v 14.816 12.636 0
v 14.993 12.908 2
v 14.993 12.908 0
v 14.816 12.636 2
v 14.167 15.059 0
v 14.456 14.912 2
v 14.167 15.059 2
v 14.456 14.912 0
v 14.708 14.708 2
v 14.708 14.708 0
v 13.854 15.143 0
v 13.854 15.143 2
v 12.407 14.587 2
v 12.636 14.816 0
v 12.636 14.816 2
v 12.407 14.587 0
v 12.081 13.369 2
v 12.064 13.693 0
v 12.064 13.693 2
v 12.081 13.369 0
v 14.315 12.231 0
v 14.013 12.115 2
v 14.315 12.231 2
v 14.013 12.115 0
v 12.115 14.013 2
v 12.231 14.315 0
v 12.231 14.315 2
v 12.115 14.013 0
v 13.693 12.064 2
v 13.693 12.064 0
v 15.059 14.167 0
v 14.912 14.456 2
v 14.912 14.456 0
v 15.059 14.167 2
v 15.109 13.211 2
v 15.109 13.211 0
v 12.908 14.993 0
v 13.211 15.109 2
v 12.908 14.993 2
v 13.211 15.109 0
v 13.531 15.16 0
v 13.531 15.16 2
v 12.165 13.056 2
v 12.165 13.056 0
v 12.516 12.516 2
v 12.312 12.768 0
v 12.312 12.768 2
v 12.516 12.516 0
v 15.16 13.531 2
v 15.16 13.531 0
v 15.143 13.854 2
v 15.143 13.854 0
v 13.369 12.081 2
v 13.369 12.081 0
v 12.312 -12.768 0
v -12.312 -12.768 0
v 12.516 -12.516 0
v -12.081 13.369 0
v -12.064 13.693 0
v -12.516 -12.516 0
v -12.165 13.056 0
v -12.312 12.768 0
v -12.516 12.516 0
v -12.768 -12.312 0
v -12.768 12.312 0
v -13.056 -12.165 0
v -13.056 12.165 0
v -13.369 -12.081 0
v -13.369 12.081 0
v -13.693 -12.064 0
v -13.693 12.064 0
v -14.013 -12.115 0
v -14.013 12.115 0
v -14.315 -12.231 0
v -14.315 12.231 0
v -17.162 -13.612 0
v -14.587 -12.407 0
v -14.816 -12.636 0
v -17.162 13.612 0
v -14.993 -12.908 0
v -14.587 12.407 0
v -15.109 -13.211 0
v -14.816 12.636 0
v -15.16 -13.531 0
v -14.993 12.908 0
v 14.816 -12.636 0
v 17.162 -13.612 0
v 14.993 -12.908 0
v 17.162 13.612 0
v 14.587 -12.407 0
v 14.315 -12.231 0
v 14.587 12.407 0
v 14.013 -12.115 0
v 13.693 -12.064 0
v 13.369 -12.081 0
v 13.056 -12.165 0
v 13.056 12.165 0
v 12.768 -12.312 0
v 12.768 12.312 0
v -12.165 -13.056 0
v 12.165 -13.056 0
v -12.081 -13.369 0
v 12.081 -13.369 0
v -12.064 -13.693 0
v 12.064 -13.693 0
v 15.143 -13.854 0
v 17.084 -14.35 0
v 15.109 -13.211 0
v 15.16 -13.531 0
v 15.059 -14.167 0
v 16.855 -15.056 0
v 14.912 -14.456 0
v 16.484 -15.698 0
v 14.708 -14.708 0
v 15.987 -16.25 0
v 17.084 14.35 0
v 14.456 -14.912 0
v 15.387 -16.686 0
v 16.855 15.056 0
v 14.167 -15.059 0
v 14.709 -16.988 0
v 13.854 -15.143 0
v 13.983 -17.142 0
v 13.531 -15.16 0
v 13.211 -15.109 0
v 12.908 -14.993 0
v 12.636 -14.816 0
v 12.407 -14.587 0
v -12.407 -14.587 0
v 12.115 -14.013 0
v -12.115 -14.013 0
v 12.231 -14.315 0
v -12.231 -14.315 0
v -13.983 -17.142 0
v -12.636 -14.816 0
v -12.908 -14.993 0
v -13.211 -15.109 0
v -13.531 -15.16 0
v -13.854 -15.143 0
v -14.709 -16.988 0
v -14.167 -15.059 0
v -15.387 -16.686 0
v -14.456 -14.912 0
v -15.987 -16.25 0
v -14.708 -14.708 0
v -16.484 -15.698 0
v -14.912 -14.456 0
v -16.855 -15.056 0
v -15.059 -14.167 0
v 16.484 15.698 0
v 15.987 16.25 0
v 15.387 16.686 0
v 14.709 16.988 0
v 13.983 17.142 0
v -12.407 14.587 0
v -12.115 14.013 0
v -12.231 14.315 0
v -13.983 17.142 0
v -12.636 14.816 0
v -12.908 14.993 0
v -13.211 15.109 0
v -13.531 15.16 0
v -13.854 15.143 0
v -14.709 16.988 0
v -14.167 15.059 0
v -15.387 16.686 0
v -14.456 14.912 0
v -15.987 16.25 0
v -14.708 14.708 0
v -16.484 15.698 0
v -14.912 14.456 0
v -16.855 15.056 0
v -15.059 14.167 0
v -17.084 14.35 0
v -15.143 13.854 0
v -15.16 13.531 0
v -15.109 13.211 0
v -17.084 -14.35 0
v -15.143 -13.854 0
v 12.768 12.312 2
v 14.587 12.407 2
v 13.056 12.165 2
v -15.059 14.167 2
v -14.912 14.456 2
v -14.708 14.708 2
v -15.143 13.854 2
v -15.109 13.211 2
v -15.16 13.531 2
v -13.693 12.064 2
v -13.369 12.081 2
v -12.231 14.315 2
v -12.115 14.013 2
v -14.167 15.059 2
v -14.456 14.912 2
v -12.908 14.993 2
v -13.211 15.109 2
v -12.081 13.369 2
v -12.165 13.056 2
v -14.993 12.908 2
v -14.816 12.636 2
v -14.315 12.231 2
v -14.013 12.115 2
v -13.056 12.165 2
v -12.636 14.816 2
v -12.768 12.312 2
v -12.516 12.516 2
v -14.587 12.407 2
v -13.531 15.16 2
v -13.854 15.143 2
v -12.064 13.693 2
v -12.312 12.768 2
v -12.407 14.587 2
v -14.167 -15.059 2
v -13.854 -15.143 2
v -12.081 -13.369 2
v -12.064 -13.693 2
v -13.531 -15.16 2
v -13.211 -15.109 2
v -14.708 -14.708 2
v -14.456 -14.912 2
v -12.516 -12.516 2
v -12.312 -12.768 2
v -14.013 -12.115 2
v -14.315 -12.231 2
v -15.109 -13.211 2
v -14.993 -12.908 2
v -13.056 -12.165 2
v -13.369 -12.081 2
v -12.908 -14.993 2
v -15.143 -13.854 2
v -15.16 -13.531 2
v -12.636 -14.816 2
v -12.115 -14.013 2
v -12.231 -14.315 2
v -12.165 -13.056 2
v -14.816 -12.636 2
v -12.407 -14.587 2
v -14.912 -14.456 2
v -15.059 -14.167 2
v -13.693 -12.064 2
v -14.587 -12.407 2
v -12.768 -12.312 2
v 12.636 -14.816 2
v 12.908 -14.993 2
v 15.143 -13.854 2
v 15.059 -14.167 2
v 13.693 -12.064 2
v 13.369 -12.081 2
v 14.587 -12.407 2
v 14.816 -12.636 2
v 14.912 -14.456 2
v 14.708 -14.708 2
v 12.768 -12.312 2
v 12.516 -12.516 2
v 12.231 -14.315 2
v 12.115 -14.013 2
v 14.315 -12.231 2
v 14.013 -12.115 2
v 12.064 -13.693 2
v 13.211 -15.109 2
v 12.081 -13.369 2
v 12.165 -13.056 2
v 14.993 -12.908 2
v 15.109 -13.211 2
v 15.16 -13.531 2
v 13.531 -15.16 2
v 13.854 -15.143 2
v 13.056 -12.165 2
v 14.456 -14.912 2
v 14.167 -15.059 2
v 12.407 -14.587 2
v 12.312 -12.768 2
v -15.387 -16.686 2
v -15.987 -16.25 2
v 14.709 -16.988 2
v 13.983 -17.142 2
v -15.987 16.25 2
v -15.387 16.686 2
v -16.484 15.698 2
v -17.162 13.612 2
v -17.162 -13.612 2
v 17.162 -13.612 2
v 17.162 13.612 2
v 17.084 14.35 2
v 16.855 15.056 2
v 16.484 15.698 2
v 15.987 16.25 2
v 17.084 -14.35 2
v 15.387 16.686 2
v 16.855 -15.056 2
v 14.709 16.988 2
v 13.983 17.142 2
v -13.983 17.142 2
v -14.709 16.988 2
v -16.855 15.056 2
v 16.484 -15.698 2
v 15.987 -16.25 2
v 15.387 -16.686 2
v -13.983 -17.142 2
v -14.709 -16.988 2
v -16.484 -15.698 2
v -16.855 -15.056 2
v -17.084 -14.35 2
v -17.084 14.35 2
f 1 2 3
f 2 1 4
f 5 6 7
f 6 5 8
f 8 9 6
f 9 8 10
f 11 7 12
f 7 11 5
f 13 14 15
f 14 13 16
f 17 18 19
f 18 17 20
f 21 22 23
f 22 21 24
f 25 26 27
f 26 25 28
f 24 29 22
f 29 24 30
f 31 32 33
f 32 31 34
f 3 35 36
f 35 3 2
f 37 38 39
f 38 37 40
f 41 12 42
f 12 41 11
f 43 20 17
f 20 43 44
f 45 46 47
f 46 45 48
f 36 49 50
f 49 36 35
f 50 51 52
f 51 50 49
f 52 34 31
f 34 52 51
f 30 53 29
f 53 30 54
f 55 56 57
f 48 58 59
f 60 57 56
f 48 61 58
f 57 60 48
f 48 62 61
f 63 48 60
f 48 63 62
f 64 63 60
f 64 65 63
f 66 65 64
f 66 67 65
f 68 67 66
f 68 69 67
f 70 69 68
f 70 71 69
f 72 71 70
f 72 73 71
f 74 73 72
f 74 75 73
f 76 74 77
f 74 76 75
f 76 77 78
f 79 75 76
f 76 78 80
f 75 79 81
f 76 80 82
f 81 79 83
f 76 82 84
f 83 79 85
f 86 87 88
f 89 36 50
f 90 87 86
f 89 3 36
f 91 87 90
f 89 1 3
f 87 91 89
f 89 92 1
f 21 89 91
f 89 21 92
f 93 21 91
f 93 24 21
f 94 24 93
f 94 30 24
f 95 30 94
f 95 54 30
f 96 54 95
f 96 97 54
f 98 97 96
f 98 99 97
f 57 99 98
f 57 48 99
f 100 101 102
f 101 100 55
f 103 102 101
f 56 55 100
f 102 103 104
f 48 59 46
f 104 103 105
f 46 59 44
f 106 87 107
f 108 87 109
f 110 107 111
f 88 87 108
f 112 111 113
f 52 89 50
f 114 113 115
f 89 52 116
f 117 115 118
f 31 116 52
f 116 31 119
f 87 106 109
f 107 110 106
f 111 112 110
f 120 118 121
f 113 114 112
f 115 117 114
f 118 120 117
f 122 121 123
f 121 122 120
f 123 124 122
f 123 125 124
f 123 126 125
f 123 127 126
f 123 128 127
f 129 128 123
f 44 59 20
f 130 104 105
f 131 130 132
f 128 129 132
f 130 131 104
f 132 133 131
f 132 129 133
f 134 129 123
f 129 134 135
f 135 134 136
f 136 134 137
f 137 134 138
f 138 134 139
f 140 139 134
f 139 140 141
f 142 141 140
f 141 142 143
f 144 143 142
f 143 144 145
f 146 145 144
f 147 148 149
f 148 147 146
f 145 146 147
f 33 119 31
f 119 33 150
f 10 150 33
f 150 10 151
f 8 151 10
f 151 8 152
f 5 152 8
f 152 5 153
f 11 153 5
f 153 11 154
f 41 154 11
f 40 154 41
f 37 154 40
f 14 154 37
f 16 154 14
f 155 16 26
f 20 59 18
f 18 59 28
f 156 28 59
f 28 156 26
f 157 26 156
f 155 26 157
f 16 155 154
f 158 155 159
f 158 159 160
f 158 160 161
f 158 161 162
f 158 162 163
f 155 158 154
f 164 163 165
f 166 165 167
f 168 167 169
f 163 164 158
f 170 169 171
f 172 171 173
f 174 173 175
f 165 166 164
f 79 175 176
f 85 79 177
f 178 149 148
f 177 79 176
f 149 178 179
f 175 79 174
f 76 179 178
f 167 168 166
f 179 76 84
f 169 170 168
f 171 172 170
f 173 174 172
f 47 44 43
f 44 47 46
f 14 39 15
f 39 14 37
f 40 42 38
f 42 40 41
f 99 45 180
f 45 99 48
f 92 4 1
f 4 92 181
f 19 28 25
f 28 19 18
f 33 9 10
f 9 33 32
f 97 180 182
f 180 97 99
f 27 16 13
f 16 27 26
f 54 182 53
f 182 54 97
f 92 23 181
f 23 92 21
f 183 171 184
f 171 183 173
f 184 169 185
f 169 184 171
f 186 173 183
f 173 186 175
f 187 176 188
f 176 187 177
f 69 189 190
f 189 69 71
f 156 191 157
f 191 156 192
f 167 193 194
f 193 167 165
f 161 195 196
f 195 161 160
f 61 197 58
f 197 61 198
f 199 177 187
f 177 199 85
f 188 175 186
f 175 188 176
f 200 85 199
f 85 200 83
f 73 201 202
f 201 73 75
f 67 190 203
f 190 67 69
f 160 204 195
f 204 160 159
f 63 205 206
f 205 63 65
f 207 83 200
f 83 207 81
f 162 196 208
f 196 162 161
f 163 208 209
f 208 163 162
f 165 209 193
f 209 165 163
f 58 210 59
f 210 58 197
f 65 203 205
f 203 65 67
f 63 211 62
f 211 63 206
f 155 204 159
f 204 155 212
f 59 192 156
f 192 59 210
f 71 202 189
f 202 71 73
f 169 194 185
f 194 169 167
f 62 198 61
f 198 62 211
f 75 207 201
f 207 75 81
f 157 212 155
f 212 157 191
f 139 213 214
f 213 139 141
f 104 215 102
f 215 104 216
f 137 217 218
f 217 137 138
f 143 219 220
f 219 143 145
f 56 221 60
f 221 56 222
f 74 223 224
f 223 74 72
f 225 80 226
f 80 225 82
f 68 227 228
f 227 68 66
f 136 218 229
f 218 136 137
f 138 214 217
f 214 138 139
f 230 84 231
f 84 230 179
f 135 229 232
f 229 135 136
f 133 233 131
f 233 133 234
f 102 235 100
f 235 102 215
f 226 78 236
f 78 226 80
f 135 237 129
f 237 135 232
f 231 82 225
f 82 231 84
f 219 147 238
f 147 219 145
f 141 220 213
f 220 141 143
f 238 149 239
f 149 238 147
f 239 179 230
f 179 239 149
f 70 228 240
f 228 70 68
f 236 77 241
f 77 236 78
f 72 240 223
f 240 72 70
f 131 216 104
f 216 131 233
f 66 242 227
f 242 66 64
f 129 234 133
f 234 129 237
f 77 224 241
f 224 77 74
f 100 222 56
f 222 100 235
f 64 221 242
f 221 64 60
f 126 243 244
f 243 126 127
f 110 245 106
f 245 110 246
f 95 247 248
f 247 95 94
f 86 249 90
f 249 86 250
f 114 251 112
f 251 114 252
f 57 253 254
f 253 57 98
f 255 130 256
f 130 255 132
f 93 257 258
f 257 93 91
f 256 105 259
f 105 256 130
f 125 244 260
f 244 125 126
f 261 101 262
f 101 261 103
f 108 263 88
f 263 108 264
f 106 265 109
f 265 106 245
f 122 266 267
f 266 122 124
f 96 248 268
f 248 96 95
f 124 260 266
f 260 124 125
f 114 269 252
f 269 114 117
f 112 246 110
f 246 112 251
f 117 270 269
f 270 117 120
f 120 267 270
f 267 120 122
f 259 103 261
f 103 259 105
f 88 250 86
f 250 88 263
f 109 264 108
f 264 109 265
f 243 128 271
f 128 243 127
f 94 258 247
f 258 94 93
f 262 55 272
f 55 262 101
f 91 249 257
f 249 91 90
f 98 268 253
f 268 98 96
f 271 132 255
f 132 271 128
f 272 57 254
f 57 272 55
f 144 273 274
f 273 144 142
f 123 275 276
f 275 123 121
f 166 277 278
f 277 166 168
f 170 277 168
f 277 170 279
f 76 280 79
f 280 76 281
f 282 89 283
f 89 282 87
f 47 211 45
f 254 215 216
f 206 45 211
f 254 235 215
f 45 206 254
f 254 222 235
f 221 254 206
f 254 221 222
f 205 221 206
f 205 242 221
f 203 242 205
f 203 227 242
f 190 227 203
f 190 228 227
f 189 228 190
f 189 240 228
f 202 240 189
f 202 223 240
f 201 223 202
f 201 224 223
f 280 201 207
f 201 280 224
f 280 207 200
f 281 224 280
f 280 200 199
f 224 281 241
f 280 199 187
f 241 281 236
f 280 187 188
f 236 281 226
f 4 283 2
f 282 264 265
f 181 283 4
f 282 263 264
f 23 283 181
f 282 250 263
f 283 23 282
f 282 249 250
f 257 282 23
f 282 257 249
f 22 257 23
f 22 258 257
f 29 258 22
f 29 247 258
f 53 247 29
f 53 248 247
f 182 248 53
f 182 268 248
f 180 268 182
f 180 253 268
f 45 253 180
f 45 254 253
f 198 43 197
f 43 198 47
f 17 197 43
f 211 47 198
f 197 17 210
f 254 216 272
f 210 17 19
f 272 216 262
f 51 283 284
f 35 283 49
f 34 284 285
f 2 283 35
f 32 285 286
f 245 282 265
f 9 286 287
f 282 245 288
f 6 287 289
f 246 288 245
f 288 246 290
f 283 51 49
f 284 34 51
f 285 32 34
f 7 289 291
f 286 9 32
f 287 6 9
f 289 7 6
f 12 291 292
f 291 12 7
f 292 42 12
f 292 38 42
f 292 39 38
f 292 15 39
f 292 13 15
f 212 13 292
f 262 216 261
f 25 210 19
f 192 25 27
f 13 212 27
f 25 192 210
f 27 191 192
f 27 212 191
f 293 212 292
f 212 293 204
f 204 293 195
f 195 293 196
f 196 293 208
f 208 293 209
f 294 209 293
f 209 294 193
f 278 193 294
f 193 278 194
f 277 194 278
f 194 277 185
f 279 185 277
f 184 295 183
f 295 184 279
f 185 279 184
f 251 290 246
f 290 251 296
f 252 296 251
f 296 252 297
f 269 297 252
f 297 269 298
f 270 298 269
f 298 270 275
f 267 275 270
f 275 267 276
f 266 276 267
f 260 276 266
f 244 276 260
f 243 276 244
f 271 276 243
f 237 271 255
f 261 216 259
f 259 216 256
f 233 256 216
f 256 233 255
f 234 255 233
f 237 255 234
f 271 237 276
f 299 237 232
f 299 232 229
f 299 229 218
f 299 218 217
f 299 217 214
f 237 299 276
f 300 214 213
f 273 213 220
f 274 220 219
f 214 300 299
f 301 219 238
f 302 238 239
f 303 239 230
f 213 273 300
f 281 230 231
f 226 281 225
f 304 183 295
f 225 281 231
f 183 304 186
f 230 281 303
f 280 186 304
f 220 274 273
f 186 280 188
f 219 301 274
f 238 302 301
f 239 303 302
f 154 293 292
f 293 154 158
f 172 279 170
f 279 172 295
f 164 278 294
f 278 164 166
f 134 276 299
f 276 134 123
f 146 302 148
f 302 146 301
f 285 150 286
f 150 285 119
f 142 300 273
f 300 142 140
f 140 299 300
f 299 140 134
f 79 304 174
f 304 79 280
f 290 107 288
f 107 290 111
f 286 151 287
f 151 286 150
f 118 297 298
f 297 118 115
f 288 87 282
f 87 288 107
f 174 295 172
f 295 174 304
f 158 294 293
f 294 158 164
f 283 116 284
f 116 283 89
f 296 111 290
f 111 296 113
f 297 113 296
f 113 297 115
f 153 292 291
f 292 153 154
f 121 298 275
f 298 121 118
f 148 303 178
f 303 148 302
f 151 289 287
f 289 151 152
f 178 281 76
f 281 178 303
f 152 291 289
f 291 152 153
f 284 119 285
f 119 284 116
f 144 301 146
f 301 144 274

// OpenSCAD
margin = 0.2;

board_height = 2.6;
bottom_thickness = 2;

motor_radius = 49 / 2;

mount_hole_radius = 2.7 / 2 + margin;
mount_hole_distance_to_center = 38.5 / 2;
plate_mount_hole_margin = 2;
mount_holes_distance = mount_hole_distance_to_center * sin(45) * 2;

module mount_hole(deg) {
    rotate([0, 0, deg])
    translate([mount_hole_distance_to_center, 0, 0])
    cylinder(h = bottom_thickness + 0.1, r = mount_hole_radius);
}

$fs = 0.2;

difference() {
    translate([-mount_holes_distance/2, -mount_holes_distance/2, 0])
    minkowski() {
        cube([mount_holes_distance, mount_holes_distance, bottom_thickness - 0.1]);
        cylinder(h = 0.1, r = mount_hole_radius + plate_mount_hole_margin);
    }
    
    for(deg = [45 : 90 : 360 - 45]) mount_hole(deg);
}
